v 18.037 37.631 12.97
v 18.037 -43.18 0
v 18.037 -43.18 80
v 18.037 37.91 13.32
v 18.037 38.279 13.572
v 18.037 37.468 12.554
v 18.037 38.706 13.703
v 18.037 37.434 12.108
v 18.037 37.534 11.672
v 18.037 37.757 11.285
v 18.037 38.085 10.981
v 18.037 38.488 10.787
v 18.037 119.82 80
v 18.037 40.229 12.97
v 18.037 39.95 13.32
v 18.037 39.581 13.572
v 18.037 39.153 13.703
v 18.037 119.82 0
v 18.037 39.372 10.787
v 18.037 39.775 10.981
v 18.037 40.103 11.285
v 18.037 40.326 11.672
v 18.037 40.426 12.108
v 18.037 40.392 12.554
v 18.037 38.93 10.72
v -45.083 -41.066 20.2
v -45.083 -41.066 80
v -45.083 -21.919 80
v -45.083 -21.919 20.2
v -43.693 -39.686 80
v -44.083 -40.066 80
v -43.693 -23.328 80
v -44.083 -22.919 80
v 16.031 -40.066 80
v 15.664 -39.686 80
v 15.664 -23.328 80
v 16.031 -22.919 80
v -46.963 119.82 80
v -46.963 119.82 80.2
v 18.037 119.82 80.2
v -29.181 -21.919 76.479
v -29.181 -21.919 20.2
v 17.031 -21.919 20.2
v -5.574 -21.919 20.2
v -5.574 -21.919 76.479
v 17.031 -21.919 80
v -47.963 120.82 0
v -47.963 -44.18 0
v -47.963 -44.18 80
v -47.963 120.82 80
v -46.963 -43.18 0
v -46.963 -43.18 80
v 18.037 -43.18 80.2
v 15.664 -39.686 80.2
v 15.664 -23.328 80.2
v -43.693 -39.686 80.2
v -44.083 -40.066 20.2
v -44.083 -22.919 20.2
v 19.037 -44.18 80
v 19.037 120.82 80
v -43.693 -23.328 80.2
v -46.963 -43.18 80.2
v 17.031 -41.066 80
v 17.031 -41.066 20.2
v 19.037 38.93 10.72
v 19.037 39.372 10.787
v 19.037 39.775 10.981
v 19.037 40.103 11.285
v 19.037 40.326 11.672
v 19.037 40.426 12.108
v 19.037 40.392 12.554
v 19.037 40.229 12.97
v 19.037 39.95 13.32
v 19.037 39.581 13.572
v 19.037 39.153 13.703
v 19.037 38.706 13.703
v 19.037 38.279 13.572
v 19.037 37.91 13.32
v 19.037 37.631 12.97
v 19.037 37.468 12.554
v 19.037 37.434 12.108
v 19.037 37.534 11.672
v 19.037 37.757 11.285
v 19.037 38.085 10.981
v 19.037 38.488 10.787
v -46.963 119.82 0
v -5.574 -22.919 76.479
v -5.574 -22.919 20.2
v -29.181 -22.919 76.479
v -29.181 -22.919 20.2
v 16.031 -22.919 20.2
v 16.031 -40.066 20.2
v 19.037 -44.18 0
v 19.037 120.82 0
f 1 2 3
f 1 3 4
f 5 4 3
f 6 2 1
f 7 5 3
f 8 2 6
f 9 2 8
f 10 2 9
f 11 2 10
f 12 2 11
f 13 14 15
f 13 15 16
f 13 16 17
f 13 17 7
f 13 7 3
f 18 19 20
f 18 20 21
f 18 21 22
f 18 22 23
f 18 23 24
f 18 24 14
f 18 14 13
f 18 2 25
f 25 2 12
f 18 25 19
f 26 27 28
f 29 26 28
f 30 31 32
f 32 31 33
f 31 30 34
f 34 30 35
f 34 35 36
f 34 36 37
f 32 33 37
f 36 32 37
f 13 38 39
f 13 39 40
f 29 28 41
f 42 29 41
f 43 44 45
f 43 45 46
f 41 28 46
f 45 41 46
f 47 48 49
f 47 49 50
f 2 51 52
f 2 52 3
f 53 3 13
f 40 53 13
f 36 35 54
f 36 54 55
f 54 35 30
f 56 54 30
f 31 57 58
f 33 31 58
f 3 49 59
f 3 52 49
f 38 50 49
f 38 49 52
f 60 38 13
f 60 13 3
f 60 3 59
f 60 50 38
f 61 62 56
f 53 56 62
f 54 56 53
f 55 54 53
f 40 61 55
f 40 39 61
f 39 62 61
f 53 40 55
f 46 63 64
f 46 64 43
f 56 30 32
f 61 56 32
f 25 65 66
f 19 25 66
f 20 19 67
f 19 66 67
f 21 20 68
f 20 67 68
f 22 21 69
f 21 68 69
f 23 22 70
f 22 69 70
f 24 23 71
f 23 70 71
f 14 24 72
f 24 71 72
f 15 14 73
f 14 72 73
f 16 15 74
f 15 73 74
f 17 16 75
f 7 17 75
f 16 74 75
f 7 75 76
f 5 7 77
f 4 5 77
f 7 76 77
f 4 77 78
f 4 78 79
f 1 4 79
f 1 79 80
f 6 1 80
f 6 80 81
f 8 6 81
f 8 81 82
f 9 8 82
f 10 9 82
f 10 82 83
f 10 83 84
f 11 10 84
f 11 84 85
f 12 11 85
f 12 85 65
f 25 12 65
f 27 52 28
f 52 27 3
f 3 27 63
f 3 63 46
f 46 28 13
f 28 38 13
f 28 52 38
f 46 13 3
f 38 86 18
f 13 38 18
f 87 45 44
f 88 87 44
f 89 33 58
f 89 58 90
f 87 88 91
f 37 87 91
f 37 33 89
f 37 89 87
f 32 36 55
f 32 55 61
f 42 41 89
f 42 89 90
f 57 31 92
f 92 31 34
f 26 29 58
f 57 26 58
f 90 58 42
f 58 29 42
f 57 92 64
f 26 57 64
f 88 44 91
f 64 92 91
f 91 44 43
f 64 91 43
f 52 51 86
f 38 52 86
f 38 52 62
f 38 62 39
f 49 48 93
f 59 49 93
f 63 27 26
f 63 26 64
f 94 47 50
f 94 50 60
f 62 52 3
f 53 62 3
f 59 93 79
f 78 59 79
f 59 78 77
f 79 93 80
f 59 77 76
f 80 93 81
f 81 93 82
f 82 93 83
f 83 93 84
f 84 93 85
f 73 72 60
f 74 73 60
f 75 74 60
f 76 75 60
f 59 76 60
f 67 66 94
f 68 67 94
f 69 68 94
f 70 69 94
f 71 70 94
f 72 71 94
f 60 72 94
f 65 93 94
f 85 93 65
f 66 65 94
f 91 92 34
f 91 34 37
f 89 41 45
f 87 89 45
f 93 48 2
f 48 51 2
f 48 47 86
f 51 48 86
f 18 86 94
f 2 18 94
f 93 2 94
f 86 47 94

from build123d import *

# Parameters (mm, degrees)
SKETCH2_W           = 67
SKETCH2_H           = 165
SKETCH2_W_2         = 65
SKETCH2_H_2         = 163
EXTRUDE_THIN1_DEPTH = 80
SKETCH3_W           = 65
SKETCH3_H           = 163
BOSS_EXTRUDE1_DEPTH = 0.2
SKETCH7_W           = 62.114238051
SKETCH7_H           = 19.14674024
SKETCH7_W_2         = 60.114238051
SKETCH7_H_2         = 17.14674024
EXTRUDE_THIN7_DEPTH = 60
SKETCH8_W           = 23.60764342
SKETCH8_H           = 56.279229241
CUT_EXTRUDE1_DEPTH  = 10
SKETCH9_W           = 59.357592206
SKETCH9_H           = 16.357775012
CUT_EXTRUDE2_DEPTH  = 10
SKETCH10_R          = 1.5
CUT_EXTRUDE3_DEPTH  = 20


with BuildPart() as part:
    # Sketch2 → Extrude-Thin1 (new body)
    with BuildSketch(Plane.XY):
        with Locations((-14.463197467, 38.32)):
            Rectangle(SKETCH2_W, SKETCH2_H)
        with Locations((-14.463197467, 38.32)):
            Rectangle(SKETCH2_W_2, SKETCH2_H_2, mode=Mode.SUBTRACT)
    extrude(amount=EXTRUDE_THIN1_DEPTH)

    # Sketch10 → Cut-Extrude3 (cut)
    with BuildSketch(Plane(origin=(19.036802533, 0, 0), x_dir=(0, 0, -1), z_dir=(1, 0, 0))):
        with Locations((-12.220104164, 38.92992837)):
            Circle(SKETCH10_R)
    extrude(amount=-CUT_EXTRUDE3_DEPTH, mode=Mode.SUBTRACT)


with BuildPart() as body_2:
    # Sketch3 → Boss-Extrude1 (new body)
    with BuildSketch(Plane.XY.offset(80)):
        with Locations((-14.463197467, 38.32)):
            Rectangle(SKETCH3_W, SKETCH3_H)
    extrude(amount=BOSS_EXTRUDE1_DEPTH)

    # Sketch7 → Extrude-Thin7 (add)
    with BuildSketch(Plane.XY.offset(80.2)):
        with Locations((-14.025735507, -31.49245653)):
            Rectangle(SKETCH7_W, SKETCH7_H)
        with Locations((-14.025735507, -31.49245653)):
            Rectangle(SKETCH7_W_2, SKETCH7_H_2, mode=Mode.SUBTRACT)
    extrude(amount=-EXTRUDE_THIN7_DEPTH)

    # Sketch8 → Cut-Extrude1 (cut)
    with BuildSketch(Plane(origin=(0, -21.91908641, 0), x_dir=(1, 0, 0), z_dir=(0, 1, 0))):
        with Locations((-17.37740118, -48.339614621)):
            Rectangle(SKETCH8_W, SKETCH8_H)
    extrude(amount=-CUT_EXTRUDE1_DEPTH, mode=Mode.SUBTRACT)

    # Sketch9 → Cut-Extrude2 (cut)
    with BuildSketch(Plane(origin=(0, 0, 80), x_dir=(-1, 0, 0), z_dir=(0, 0, -1))):
        with Locations((14.014495431, -31.506928236)):
            Rectangle(SKETCH9_W, SKETCH9_H)
    extrude(amount=-CUT_EXTRUDE2_DEPTH, mode=Mode.SUBTRACT)


solid = Compound([part.part, body_2.part])
